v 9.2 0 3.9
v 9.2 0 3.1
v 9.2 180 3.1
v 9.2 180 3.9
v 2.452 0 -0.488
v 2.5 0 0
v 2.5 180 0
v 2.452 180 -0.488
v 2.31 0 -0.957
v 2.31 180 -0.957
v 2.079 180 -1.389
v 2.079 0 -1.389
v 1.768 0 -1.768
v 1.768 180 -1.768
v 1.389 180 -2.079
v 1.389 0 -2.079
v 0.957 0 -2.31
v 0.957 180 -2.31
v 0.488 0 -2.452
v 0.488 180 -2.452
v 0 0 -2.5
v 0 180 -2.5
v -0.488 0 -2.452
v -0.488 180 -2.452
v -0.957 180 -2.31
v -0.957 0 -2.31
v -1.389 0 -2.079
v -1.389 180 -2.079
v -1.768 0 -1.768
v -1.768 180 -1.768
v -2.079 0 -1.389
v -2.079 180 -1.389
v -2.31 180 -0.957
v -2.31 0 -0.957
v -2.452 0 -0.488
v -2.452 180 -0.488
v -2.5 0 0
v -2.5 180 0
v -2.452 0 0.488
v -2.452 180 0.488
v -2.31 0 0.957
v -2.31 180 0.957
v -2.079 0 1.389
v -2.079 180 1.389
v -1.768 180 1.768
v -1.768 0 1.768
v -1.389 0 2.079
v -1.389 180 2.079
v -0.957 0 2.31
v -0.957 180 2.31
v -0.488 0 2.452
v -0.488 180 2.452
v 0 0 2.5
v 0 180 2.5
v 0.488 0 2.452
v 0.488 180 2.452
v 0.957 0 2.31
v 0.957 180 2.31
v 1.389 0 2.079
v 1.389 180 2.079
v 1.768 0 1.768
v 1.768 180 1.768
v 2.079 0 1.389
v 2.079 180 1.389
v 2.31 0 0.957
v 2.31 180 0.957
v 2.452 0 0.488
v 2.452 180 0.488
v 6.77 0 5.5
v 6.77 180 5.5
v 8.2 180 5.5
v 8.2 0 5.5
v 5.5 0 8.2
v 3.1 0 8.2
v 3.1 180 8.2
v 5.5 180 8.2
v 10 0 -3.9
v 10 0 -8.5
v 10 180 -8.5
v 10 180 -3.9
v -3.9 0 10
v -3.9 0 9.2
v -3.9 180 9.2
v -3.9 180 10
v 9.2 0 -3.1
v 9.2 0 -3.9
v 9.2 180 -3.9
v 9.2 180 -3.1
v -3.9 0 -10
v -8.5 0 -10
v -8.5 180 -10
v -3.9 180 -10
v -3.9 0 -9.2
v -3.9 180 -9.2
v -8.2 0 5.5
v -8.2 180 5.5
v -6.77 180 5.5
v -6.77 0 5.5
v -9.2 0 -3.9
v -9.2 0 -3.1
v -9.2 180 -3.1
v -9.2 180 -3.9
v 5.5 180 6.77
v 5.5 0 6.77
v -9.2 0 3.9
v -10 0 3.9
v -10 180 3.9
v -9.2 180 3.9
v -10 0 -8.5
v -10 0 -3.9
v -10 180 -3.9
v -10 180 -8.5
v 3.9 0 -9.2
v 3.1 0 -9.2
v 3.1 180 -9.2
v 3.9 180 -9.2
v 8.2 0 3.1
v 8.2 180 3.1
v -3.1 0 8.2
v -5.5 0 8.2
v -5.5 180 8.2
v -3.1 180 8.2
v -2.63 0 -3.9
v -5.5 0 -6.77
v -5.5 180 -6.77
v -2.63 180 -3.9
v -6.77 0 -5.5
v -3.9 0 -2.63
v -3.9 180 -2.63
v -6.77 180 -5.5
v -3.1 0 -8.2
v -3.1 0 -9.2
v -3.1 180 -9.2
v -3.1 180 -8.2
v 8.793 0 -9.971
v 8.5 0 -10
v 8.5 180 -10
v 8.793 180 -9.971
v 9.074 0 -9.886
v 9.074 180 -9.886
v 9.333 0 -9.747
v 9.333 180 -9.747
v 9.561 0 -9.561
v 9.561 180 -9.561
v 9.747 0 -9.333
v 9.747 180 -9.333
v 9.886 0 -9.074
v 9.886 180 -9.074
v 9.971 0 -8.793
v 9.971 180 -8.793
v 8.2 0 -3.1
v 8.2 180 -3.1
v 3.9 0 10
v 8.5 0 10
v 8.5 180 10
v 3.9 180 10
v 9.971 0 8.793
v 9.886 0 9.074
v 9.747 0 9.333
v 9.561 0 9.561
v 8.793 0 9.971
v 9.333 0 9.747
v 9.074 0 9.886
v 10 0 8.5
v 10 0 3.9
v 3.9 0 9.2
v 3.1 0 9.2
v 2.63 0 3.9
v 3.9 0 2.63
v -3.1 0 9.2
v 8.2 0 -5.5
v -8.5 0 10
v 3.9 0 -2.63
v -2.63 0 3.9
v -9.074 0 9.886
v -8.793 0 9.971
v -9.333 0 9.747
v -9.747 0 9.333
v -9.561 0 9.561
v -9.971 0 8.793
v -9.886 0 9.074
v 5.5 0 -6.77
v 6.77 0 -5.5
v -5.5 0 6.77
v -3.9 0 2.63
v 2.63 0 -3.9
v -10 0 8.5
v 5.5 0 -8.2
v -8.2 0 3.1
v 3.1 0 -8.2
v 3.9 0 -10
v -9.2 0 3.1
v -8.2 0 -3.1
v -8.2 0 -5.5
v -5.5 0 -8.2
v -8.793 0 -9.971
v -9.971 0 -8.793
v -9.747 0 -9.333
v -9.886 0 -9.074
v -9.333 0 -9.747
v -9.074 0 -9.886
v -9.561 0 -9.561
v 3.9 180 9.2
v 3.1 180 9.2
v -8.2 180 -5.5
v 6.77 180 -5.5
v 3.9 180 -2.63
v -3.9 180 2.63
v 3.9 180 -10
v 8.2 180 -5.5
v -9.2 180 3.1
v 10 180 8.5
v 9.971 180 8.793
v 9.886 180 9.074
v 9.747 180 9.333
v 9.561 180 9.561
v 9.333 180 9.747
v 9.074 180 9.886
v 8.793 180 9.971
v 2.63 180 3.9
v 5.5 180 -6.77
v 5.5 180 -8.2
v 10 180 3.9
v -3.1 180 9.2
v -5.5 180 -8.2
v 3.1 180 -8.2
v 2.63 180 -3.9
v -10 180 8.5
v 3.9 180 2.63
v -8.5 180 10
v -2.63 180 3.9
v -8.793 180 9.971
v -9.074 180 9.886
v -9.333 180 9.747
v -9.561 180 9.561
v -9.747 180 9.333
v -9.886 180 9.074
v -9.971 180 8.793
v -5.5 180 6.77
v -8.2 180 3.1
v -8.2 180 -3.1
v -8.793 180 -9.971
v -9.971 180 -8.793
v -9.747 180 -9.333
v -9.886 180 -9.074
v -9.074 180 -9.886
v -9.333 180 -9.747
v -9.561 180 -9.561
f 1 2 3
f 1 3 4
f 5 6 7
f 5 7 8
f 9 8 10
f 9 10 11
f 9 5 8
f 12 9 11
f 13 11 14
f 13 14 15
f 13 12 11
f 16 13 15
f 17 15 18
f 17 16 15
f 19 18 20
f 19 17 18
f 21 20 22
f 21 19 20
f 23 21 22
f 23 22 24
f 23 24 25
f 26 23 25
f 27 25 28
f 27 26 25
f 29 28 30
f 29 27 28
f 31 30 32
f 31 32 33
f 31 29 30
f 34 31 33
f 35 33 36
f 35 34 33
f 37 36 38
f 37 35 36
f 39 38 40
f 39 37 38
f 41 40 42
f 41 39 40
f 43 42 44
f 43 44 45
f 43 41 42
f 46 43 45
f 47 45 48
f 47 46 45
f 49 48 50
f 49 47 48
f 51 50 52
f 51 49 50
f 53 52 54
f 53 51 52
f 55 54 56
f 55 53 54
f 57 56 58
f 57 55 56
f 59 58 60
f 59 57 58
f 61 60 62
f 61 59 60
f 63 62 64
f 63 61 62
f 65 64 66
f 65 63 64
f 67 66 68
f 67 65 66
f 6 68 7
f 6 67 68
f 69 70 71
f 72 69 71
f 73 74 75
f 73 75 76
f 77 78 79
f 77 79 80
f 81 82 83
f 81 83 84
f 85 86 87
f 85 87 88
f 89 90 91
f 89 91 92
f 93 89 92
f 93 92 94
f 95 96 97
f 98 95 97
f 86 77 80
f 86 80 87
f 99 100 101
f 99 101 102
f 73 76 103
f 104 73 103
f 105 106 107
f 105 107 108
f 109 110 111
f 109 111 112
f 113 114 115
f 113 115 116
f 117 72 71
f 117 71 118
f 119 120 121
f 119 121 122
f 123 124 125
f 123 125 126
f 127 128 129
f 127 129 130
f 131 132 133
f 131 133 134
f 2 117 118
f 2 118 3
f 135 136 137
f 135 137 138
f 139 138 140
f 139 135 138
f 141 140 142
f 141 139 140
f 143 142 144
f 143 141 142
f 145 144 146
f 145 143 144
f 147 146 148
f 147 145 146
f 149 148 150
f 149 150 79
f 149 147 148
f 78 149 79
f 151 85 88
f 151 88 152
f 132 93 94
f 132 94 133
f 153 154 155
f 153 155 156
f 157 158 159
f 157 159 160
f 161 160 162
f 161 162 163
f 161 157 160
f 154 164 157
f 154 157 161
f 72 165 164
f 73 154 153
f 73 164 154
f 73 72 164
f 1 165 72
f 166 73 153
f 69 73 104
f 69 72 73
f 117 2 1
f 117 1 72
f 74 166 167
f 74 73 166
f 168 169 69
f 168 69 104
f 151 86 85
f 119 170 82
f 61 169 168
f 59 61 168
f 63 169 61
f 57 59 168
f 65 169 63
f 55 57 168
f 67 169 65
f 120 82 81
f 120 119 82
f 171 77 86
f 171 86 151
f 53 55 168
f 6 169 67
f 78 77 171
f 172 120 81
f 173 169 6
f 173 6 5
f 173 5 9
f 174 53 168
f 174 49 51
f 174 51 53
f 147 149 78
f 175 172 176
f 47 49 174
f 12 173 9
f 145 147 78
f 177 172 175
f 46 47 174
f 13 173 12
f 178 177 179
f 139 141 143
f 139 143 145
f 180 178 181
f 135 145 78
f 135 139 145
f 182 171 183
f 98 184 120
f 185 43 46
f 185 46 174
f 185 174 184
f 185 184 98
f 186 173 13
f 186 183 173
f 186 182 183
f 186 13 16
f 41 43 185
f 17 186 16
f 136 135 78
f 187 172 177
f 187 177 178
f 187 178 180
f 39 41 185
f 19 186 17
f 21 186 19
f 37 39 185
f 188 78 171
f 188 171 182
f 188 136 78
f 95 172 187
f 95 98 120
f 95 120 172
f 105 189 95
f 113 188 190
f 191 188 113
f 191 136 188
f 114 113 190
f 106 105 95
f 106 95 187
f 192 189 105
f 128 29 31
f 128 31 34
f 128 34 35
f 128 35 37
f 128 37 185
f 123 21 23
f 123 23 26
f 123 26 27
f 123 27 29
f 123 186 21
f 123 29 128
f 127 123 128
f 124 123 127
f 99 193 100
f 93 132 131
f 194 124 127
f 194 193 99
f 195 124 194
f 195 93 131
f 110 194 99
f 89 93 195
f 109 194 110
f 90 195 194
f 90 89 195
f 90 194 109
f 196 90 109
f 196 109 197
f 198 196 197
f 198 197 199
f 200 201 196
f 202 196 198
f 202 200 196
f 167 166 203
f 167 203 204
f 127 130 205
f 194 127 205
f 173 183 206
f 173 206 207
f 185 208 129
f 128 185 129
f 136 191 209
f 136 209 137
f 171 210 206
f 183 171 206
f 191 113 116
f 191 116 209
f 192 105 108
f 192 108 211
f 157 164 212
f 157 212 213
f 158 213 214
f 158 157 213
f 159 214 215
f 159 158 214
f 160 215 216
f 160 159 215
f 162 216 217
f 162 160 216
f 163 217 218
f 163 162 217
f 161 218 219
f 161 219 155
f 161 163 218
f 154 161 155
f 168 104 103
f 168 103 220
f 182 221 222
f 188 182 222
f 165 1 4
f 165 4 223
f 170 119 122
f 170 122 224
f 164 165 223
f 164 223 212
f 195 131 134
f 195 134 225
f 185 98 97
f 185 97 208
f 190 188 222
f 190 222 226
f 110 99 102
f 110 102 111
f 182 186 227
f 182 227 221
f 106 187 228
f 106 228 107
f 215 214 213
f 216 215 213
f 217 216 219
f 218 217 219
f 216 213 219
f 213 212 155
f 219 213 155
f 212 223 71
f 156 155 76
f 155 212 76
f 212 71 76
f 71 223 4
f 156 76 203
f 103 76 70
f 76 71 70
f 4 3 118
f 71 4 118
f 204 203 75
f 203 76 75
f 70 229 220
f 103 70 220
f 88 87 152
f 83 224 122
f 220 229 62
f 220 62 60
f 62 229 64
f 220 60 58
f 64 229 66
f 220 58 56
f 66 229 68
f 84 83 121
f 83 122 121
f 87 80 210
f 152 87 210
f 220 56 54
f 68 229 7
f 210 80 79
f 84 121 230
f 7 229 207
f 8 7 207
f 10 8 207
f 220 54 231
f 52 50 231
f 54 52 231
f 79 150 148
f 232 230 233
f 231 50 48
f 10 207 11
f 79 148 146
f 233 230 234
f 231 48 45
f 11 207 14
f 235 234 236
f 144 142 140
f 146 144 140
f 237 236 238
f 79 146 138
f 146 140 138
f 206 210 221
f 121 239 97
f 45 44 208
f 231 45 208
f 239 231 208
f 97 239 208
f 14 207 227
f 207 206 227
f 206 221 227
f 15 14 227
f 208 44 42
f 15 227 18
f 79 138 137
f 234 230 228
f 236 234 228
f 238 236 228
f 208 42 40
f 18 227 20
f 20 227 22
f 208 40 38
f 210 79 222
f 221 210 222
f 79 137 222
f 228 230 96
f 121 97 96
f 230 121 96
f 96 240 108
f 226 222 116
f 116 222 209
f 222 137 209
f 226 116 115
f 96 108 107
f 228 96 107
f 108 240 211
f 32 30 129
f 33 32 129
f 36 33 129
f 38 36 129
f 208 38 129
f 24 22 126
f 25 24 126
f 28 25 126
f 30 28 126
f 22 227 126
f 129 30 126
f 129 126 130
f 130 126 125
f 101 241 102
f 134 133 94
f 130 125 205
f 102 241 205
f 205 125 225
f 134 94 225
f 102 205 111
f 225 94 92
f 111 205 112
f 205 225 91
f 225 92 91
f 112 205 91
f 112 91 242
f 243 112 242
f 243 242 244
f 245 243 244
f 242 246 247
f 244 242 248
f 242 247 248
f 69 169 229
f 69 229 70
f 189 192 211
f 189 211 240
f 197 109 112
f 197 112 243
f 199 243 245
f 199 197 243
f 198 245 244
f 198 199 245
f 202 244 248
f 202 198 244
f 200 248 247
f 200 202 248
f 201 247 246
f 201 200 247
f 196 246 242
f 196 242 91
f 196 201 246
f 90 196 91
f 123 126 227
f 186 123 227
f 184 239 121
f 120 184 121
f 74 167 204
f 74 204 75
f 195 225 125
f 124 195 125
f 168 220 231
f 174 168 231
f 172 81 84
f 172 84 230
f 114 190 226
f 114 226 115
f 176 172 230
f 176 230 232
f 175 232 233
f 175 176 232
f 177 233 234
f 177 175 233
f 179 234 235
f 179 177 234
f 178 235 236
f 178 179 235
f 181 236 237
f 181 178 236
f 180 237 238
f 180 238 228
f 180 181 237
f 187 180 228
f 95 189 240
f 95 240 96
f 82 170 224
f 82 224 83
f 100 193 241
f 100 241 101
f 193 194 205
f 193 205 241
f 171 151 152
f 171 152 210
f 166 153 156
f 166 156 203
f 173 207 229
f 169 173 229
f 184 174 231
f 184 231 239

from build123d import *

# Parameters (mm, degrees)
SKETCH1_R           = 2.5
BOSS_EXTRUDE1_DEPTH = 180


with BuildPart() as part:
    # Sketch1 → Boss-Extrude1 (new body)
    with BuildSketch(Plane(origin=(0, 0, 0), x_dir=(1, 0, 0), z_dir=(0, 1, 0))):
        with BuildLine():
            Line((3.9, 10), (8.5, 10))
            ThreePointArc((8.5, 10), (9.560660172, 9.560660172), (10, 8.5))
            Line((10, 8.5), (10, 3.9))
            Line((10, 3.9), (9.2, 3.9))
            Line((9.2, 3.9), (9.2, 3.1))
            Line((9.2, 3.1), (8.2, 3.1))
            Line((8.2, 3.1), (8.2, 5.5))
            Line((8.2, 5.5), (6.77, 5.5))
            Line((6.77, 5.5), (3.9, 2.63))
            Line((3.9, 2.63), (3.9, 0))
            Line((3.9, 0), (3.9, -2.63))
            Line((3.9, -2.63), (6.77, -5.5))
            Line((6.77, -5.5), (8.2, -5.5))
            Line((8.2, -5.5), (8.2, -3.1))
            Line((8.2, -3.1), (9.2, -3.1))
            Line((9.2, -3.1), (9.2, -3.9))
            Line((9.2, -3.9), (10, -3.9))
            Line((10, -3.9), (10, -8.5))
            ThreePointArc((10, -8.5), (9.560660172, -9.560660172), (8.5, -10))
            Line((8.5, -10), (3.9, -10))
            Line((3.9, -10), (3.9, -9.2))
            Line((3.9, -9.2), (3.1, -9.2))
            Line((3.1, -9.2), (3.1, -8.2))
            Line((3.1, -8.2), (5.5, -8.2))
            Line((5.5, -8.2), (5.5, -6.77))
            Line((5.5, -6.77), (2.63, -3.9))
            Line((2.63, -3.9), (0, -3.9))
            Line((0, -3.9), (-2.63, -3.9))
            Line((-2.63, -3.9), (-5.5, -6.77))
            Line((-5.5, -6.77), (-5.5, -8.2))
            Line((-5.5, -8.2), (-3.1, -8.2))
            Line((-3.1, -8.2), (-3.1, -9.2))
            Line((-3.1, -9.2), (-3.9, -9.2))
            Line((-3.9, -9.2), (-3.9, -10))
            Line((-3.9, -10), (-8.5, -10))
            ThreePointArc((-8.5, -10), (-9.560660172, -9.560660172), (-10, -8.5))
            Line((-10, -8.5), (-10, -3.9))
            Line((-10, -3.9), (-9.2, -3.9))
            Line((-9.2, -3.9), (-9.2, -3.1))
            Line((-9.2, -3.1), (-8.2, -3.1))
            Line((-8.2, -3.1), (-8.2, -5.5))
            Line((-8.2, -5.5), (-6.77, -5.5))
            Line((-6.77, -5.5), (-3.9, -2.63))
            Line((-3.9, -2.63), (-3.9, 0))
            Line((-3.9, 0), (-3.9, 2.63))
            Line((-3.9, 2.63), (-6.77, 5.5))
            Line((-6.77, 5.5), (-8.2, 5.5))
            Line((-8.2, 5.5), (-8.2, 3.1))
            Line((-8.2, 3.1), (-9.2, 3.1))
            Line((-9.2, 3.1), (-9.2, 3.9))
            Line((-9.2, 3.9), (-10, 3.9))
            Line((-10, 3.9), (-10, 8.5))
            ThreePointArc((-10, 8.5), (-9.560660172, 9.560660172), (-8.5, 10))
            Line((-8.5, 10), (-3.9, 10))
            Line((-3.9, 10), (-3.9, 9.2))
            Line((-3.9, 9.2), (-3.1, 9.2))
            Line((-3.1, 9.2), (-3.1, 8.2))
            Line((-3.1, 8.2), (-5.5, 8.2))
            Line((-5.5, 8.2), (-5.5, 6.77))
            Line((-5.5, 6.77), (-2.63, 3.9))
            Line((-2.63, 3.9), (2.63, 3.9))
            Line((2.63, 3.9), (5.5, 6.77))
            Line((5.5, 6.77), (5.5, 8.2))
            Line((5.5, 8.2), (3.1, 8.2))
            Line((3.1, 8.2), (3.1, 9.2))
            Line((3.1, 9.2), (3.9, 9.2))
            Line((3.9, 9.2), (3.9, 10))
        make_face()
        Circle(SKETCH1_R, mode=Mode.SUBTRACT)
    extrude(amount=BOSS_EXTRUDE1_DEPTH)


solid = part.part
